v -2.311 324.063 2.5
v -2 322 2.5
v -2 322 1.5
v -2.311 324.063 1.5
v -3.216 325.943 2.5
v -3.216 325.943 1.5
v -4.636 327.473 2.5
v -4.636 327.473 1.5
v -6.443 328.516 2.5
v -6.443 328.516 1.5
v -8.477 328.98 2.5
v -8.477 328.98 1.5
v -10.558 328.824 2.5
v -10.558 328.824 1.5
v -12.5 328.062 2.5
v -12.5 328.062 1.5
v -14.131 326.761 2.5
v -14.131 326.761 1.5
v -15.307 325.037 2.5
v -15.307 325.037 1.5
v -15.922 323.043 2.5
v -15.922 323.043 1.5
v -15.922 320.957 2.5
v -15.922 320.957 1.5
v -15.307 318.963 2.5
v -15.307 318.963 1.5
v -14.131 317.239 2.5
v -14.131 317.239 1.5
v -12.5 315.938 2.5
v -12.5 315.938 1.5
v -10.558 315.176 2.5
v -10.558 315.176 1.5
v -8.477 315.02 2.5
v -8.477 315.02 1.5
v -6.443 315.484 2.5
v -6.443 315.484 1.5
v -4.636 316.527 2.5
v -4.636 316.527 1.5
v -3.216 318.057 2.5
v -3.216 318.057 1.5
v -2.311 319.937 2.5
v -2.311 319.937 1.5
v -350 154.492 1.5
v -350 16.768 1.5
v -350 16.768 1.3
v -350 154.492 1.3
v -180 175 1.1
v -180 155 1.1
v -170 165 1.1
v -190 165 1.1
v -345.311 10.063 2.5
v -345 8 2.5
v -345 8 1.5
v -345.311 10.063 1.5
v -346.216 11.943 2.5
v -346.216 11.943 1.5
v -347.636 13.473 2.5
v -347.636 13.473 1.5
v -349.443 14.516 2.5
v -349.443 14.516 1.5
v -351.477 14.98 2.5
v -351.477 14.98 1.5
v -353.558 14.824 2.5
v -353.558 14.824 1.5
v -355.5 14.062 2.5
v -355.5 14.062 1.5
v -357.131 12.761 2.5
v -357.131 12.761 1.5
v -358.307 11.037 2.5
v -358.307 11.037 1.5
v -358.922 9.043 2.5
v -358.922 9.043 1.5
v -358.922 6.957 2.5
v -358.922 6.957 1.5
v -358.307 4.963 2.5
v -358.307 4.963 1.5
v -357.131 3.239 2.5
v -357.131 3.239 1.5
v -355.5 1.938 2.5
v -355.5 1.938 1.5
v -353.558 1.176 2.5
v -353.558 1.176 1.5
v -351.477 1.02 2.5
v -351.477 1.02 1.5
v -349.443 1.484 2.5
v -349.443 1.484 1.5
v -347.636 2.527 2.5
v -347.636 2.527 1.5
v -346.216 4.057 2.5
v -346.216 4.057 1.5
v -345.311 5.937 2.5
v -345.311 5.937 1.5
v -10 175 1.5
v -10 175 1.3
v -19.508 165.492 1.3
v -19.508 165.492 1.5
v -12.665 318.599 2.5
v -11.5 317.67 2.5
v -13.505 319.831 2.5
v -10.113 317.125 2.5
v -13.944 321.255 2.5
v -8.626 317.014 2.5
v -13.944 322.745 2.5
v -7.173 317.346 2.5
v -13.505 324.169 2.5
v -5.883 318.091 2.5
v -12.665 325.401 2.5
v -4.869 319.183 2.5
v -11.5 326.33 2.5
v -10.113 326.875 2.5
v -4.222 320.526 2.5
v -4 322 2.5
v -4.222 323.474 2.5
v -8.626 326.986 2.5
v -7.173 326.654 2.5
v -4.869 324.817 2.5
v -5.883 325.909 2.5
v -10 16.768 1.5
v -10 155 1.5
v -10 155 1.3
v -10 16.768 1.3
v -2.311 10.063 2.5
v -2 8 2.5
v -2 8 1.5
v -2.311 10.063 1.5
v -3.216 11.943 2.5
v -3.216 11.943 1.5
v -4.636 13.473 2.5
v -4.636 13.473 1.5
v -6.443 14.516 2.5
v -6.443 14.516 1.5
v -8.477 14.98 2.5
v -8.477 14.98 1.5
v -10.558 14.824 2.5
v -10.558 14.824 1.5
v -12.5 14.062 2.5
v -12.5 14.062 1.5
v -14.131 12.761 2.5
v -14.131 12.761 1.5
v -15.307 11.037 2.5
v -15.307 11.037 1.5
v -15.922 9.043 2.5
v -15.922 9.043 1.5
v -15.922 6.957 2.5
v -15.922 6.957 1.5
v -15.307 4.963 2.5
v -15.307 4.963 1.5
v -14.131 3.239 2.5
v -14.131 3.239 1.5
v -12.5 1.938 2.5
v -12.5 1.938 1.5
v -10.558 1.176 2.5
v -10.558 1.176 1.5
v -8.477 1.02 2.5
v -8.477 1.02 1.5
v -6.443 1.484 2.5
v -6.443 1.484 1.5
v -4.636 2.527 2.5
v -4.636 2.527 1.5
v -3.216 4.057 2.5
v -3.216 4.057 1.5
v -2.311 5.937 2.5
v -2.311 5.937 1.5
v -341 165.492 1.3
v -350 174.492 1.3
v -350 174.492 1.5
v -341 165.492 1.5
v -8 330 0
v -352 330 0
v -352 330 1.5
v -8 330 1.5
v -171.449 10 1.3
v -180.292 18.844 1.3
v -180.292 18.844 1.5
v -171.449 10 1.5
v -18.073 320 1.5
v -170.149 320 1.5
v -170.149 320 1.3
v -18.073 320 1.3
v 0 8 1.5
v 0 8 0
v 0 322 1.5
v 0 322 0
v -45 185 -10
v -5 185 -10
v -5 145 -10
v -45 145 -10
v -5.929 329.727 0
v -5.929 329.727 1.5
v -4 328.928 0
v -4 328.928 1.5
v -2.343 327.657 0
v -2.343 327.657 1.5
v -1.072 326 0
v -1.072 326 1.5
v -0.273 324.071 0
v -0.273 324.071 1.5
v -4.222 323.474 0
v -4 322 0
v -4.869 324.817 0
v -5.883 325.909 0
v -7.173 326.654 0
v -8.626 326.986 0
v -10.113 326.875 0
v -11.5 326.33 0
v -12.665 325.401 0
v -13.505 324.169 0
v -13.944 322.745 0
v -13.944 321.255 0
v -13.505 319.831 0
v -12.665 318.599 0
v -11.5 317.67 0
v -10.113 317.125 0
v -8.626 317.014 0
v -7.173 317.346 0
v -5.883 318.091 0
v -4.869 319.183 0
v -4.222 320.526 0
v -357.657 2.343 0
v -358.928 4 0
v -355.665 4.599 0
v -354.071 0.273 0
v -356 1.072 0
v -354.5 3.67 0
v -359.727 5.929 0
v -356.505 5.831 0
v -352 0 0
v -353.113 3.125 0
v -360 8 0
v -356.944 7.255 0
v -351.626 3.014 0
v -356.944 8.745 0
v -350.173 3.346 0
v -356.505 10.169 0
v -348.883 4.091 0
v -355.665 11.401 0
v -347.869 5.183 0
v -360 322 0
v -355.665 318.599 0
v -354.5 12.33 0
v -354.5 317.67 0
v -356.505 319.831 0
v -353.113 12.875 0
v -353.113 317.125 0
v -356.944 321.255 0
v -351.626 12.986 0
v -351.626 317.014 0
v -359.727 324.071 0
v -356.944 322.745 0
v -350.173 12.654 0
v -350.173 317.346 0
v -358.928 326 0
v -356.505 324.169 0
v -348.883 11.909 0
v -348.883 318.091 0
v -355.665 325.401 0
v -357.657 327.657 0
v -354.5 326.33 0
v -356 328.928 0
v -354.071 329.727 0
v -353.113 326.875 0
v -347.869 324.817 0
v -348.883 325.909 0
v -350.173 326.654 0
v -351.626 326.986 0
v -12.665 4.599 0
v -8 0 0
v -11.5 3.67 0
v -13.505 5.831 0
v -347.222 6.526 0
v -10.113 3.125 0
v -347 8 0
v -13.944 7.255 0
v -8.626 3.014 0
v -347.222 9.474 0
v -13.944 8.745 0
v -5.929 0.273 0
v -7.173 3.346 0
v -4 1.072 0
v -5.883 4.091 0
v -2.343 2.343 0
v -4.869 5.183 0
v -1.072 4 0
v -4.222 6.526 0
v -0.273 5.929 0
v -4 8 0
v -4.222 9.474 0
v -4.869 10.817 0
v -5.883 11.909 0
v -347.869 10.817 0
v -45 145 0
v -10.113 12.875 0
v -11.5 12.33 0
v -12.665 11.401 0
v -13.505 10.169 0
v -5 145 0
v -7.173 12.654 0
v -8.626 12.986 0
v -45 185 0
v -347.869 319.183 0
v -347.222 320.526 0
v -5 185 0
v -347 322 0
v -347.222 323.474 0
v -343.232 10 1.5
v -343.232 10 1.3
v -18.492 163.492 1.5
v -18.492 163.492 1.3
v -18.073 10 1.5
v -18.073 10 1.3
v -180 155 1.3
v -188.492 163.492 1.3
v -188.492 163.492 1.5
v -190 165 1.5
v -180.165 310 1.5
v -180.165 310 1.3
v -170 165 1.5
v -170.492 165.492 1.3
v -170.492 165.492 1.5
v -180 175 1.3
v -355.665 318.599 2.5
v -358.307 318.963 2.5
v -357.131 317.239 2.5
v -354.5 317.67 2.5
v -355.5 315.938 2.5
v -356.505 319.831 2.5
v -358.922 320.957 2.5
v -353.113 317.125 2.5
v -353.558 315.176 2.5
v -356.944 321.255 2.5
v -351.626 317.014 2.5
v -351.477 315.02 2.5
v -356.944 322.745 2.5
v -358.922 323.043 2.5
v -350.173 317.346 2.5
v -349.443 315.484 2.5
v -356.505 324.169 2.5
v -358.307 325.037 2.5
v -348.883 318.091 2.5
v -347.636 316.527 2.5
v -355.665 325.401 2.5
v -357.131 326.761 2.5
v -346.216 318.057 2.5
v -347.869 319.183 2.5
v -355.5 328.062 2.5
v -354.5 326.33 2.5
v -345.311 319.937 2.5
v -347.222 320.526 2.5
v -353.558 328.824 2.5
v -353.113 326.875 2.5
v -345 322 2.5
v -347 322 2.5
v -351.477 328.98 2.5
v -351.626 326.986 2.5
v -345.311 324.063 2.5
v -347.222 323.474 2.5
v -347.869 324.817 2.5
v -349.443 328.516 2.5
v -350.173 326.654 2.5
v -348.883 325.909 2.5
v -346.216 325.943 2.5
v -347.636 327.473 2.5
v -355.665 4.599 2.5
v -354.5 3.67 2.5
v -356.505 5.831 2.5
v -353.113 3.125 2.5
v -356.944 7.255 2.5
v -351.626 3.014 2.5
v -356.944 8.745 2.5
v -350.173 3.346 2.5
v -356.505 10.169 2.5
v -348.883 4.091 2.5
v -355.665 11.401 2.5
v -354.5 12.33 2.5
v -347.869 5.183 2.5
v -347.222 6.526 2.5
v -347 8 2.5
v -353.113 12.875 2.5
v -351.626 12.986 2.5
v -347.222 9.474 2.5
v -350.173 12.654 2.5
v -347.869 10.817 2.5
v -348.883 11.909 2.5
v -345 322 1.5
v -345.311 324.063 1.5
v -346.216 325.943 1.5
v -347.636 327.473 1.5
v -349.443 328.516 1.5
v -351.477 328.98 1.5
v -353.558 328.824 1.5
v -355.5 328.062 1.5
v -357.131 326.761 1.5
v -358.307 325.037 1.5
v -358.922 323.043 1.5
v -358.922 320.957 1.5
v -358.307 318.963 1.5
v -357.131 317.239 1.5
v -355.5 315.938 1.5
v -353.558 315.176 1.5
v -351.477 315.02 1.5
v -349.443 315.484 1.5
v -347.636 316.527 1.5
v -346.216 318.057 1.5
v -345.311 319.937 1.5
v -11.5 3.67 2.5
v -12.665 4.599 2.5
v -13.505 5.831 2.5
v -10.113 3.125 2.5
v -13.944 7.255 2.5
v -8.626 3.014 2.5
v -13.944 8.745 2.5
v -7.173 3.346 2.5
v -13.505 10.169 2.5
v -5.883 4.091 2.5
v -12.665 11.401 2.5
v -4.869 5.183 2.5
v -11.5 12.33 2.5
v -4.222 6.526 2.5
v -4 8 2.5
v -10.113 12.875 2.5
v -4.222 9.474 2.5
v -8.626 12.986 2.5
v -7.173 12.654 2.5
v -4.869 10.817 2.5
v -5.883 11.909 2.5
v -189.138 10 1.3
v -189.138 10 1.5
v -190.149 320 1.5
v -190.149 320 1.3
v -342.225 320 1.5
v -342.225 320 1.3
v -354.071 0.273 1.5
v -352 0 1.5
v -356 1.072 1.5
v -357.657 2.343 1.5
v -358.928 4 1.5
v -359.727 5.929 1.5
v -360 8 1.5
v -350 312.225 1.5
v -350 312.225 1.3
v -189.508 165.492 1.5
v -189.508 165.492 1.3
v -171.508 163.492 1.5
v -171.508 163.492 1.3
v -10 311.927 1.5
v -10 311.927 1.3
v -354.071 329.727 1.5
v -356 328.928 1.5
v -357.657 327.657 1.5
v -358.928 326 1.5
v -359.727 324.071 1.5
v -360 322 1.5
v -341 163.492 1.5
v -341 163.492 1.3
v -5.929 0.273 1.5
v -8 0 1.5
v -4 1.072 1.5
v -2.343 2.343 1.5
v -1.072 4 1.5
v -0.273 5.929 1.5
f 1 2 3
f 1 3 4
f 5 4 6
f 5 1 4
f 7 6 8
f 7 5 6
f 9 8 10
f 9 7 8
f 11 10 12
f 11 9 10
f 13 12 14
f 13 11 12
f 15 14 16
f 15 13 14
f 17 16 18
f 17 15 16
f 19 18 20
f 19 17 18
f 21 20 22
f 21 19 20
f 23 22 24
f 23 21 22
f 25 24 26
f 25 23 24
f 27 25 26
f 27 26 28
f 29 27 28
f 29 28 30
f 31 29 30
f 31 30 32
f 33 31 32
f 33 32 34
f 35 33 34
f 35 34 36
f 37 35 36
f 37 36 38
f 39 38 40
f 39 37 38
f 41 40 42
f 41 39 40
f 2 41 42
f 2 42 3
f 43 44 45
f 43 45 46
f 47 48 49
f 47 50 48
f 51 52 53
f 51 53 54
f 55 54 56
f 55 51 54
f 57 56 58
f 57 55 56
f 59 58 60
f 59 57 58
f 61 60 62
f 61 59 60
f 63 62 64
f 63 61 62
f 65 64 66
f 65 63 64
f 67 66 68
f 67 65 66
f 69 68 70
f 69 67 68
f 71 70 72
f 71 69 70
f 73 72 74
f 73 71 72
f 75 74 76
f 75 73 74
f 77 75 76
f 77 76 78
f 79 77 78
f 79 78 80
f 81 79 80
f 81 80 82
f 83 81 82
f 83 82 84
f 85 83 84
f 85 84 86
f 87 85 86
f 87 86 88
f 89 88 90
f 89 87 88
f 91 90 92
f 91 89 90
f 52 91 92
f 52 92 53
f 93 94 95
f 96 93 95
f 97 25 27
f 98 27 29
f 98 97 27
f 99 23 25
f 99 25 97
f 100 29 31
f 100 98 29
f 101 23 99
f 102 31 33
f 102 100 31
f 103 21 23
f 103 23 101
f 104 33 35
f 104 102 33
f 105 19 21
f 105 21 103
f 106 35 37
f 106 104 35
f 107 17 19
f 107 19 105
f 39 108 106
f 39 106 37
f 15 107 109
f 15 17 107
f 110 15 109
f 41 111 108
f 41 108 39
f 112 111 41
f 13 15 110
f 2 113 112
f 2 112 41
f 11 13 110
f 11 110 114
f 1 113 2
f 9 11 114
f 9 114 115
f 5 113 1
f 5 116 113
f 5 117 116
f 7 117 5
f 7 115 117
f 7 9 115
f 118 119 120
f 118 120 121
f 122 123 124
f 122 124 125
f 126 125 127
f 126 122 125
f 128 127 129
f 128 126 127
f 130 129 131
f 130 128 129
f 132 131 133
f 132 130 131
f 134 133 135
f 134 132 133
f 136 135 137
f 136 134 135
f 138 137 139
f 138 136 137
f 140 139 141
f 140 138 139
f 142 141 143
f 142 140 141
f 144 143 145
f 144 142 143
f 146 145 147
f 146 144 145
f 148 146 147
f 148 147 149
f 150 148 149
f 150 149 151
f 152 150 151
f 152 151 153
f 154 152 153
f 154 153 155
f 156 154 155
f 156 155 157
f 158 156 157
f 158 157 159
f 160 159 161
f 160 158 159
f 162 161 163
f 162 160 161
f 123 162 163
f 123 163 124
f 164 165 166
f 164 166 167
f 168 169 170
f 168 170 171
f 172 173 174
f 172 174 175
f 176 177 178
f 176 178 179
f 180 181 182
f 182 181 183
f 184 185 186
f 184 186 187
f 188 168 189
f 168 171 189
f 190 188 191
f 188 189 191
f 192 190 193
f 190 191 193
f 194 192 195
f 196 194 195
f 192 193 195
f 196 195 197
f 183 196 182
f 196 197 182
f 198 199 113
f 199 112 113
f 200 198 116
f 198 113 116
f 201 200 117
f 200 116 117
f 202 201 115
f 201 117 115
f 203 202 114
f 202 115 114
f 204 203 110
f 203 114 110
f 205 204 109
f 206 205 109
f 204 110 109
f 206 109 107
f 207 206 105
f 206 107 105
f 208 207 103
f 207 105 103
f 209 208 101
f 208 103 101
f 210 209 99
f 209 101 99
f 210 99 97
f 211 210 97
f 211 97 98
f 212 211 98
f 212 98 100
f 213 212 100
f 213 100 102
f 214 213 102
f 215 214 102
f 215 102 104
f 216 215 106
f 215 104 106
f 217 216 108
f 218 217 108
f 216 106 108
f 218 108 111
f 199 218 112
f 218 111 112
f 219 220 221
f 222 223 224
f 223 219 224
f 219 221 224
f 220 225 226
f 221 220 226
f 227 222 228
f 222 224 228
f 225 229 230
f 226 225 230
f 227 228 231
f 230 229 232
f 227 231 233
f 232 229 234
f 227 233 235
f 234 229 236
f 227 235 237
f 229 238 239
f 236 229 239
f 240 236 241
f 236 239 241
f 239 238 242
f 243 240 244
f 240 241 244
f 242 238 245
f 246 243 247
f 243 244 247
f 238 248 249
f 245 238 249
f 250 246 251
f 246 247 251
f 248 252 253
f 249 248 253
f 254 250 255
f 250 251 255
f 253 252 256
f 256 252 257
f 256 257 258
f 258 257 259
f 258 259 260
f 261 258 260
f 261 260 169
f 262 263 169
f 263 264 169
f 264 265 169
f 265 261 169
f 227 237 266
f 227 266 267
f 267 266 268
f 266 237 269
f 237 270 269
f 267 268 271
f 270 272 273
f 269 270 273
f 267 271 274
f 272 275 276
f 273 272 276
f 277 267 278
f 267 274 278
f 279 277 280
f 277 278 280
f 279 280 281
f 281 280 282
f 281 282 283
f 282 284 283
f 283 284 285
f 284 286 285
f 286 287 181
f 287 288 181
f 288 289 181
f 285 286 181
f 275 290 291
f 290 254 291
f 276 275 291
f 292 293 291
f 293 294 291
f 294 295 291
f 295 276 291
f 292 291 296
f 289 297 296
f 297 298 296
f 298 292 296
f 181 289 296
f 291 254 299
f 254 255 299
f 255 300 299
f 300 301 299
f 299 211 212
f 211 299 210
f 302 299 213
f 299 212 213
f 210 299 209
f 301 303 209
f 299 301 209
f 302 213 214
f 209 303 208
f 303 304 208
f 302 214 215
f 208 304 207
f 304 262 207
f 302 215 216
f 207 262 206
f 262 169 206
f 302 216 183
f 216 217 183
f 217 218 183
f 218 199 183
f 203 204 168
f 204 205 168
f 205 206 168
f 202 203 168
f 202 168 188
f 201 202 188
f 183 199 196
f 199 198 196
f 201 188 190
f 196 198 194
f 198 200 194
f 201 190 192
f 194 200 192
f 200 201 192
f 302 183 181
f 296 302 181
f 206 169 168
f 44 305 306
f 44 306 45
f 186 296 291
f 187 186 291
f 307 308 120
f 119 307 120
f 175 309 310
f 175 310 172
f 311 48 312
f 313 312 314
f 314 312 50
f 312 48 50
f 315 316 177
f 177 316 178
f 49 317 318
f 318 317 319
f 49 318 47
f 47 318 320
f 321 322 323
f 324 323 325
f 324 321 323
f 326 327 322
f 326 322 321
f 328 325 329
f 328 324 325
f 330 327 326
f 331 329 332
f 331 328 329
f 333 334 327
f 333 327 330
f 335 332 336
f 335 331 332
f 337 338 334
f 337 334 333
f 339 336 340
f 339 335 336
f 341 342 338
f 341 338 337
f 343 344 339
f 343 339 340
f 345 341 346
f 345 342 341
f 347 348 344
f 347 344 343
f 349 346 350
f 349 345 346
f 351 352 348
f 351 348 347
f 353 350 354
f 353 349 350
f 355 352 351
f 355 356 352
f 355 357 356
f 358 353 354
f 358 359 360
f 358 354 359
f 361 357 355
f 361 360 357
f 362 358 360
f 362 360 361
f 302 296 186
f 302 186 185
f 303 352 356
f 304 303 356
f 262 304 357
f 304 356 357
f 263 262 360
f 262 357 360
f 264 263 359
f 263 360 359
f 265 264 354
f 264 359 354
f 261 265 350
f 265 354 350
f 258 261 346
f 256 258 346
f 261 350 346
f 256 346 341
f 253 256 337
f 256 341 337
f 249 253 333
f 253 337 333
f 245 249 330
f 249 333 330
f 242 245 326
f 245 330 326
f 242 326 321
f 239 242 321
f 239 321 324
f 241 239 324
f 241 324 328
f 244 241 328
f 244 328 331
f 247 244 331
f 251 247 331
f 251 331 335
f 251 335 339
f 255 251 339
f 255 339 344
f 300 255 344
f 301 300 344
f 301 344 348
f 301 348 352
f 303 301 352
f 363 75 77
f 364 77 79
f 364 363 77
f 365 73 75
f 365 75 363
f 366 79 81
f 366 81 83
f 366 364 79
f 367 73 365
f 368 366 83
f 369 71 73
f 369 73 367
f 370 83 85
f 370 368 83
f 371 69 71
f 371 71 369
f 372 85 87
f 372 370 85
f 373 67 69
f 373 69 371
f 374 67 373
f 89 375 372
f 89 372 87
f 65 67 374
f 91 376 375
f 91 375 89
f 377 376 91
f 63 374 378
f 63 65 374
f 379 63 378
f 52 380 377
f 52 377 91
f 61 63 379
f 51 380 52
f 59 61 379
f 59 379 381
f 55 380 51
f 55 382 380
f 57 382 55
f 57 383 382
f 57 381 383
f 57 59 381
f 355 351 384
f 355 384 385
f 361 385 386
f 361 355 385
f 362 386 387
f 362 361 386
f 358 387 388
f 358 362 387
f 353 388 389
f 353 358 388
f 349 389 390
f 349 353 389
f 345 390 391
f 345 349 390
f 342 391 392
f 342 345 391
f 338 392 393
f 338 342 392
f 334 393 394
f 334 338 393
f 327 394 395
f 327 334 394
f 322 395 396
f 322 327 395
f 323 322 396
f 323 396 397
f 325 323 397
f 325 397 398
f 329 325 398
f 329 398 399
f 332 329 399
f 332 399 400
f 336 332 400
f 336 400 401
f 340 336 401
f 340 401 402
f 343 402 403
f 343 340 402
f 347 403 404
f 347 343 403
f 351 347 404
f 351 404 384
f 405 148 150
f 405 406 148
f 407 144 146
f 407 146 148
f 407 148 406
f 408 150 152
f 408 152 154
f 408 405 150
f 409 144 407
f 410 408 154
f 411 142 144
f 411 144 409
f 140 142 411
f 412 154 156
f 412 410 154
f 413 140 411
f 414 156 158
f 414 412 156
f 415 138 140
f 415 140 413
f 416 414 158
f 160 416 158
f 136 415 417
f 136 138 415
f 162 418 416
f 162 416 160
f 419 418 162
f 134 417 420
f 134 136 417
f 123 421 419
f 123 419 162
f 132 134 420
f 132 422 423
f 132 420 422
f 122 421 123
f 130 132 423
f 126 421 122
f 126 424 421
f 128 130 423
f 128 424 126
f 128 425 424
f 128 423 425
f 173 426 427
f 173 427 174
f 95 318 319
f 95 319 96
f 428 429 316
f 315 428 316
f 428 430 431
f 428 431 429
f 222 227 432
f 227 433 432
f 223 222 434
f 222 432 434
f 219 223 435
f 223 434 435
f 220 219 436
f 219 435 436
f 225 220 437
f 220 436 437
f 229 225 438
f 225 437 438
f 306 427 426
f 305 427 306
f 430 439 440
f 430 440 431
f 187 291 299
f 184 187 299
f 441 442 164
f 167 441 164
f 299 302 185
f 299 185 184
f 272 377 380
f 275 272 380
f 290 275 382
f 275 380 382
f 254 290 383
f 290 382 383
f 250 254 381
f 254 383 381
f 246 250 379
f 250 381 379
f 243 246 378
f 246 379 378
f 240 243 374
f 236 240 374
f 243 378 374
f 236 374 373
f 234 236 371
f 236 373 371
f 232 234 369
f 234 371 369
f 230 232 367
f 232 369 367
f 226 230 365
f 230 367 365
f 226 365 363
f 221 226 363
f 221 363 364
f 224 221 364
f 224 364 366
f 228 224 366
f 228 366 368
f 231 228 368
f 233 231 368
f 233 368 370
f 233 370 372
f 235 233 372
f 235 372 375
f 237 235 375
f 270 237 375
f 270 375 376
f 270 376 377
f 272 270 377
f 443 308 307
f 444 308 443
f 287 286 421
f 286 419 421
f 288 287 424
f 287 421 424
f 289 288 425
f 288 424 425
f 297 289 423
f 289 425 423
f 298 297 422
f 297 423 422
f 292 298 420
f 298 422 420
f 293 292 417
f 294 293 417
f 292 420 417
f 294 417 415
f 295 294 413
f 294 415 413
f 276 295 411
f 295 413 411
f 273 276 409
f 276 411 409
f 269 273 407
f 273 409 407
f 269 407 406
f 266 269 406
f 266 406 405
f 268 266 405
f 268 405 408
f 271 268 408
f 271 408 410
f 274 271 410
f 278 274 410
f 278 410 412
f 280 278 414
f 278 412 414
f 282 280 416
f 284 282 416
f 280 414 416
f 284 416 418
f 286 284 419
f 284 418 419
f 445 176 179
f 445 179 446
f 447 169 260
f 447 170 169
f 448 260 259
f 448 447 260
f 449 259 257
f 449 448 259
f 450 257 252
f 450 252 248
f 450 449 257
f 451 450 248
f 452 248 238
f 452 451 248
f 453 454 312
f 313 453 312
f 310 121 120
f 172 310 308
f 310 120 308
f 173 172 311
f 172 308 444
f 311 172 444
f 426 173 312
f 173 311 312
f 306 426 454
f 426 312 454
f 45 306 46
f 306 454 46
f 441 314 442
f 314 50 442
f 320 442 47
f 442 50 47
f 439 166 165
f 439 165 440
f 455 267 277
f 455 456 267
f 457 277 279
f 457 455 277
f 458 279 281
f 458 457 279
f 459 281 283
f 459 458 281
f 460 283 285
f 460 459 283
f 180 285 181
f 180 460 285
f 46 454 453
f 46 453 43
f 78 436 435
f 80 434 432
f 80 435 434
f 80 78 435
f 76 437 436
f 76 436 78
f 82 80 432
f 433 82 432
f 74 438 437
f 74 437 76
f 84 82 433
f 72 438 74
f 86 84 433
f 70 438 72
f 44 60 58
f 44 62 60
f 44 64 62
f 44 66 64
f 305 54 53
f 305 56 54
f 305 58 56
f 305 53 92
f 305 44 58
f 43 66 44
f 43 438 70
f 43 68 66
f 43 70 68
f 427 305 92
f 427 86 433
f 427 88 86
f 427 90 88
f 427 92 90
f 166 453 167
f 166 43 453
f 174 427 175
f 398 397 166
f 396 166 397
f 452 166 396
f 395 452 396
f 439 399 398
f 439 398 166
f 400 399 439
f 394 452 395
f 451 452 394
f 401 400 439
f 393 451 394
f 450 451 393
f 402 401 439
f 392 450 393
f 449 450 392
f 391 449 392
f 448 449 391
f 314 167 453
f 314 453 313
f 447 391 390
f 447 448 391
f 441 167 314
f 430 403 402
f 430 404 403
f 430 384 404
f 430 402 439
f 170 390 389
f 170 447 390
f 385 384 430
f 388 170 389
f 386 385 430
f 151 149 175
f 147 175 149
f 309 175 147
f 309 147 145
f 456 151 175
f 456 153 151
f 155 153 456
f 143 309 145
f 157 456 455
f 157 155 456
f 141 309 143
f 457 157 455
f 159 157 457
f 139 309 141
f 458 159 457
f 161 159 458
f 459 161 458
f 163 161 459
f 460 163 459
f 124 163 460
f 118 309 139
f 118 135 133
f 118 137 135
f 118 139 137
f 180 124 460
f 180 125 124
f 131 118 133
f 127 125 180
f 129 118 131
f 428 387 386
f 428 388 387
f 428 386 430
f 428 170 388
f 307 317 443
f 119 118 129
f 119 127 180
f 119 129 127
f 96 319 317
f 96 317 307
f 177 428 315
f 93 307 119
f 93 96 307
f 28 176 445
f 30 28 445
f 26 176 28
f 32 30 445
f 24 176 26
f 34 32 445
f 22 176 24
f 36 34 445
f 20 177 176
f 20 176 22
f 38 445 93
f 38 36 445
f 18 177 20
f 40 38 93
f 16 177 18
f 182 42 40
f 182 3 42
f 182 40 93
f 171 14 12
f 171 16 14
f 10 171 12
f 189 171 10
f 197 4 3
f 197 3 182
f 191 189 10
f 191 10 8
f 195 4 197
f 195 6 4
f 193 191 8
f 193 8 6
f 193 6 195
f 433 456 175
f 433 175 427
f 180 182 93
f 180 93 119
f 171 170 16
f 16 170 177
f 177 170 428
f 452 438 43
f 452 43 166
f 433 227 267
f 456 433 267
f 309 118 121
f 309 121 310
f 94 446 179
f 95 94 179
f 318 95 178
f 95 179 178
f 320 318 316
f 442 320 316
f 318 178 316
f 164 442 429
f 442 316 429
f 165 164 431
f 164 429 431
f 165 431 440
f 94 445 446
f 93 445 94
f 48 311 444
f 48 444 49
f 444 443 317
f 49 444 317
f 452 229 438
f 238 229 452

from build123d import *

# Parameters (mm, degrees)
ESQUISSE1_W                     = 360
ESQUISSE1_H                     = 330
BOSS_EXTRU_1_DEPTH              = 1.5
ESQUISSE2_R                     = 5
ENL_V_MAT_EXTRU_1_DEPTH         = 1.5
BOSS_EXTRU_2_START              = 1
ESQUISSE3_R                     = 7
ESQUISSE3_R_2                   = 5
BOSS_EXTRU_2_DEPTH              = 1
CONG_2_R                        = 8
CONG_4_R                        = 8
R_P_TITION_LIN_AIRE2_COUNT      = 2
R_P_TITION_LIN_AIRE2_PITCH      = 343
R_P_TITION_LIN_AIRE2_COUNT_DIR2 = 2
R_P_TITION_LIN_AIRE2_PITCH_DIR2 = 314
ENL_V_MAT_EXTRU_2_DEPTH         = 0.2
ENL_V_MAT_EXTRU_3_DEPTH         = 0.2
BOSS_EXTRU_3_DEPTH              = 0.2
BOSS_EXTRU_4_DEPTH              = 0.2
BOSS_EXTRU_5_DEPTH              = 0.2
ESQUISSE9_W                     = 40
ESQUISSE9_H                     = 40
BOSS_EXTRU_6_DEPTH              = 10


with BuildPart() as part:
    # Esquisse1 → Boss.-Extru.1 (new body)
    with BuildSketch(Plane.XY):
        with Locations((-180, 165)):
            Rectangle(ESQUISSE1_W, ESQUISSE1_H)
    extrude(amount=BOSS_EXTRU_1_DEPTH)

    # Esquisse2 → Enlèv. mat.-Extru.1 (cut)
    with BuildSketch(Plane.XY.offset(1.5)):
        with Locations((-352, 322)):
            Circle(ESQUISSE2_R)
    enl_v_mat_extru_1 = extrude(amount=-ENL_V_MAT_EXTRU_1_DEPTH, mode=Mode.SUBTRACT)

    # Esquisse3 → Boss.-Extru.2 (add)
    with BuildSketch(Plane.XY.offset(1.5).offset(BOSS_EXTRU_2_START)):
        with Locations((-352, 322)):
            Circle(ESQUISSE3_R)
        with Locations((-352, 322)):
            Circle(ESQUISSE3_R_2, mode=Mode.SUBTRACT)
    boss_extru_2 = extrude(amount=-BOSS_EXTRU_2_DEPTH)

    # Congé2
    cong_2_edges = [part.edges().sort_by_distance(p)[0] for p in [
        (-360, 0, 0.75),
        (-360, 330, 0.75),
    ]]
    fillet(cong_2_edges, radius=CONG_2_R)

    # Congé4
    cong_4_edges = [part.edges().sort_by_distance(p)[0] for p in [
        (0, 0, 0.75),
        (0, 330, 0.75),
    ]]
    fillet(cong_4_edges, radius=CONG_4_R)

    # Répétition linéaire2: Enlèv. mat.-Extru.1, Boss.-Extru.2 2 × 2
    with Locations(*[(i * R_P_TITION_LIN_AIRE2_PITCH, -j * R_P_TITION_LIN_AIRE2_PITCH_DIR2, 0) for i in range(R_P_TITION_LIN_AIRE2_COUNT) for j in range(R_P_TITION_LIN_AIRE2_COUNT_DIR2) if (i, j) != (0, 0)]):
        add(enl_v_mat_extru_1, mode=Mode.SUBTRACT)
        add(boss_extru_2)

    # Esquisse4 → Enlèv. mat.-Extru.2 (cut)
    with BuildSketch(Plane.XY.offset(1.5)):
        Polygon((-342.224801163, 320), (-18.072831487, 320), (-10, 311.927168513), (-10, 16.768229134), (-18.072831487, 10), (-343.231770866, 10), (-350, 16.768229134), (-350, 312.224801163), align=None)
    extrude(amount=-ENL_V_MAT_EXTRU_2_DEPTH, mode=Mode.SUBTRACT)

    # Esquisse5 → Enlèv. mat.-Extru.3 (cut)
    with BuildSketch(Plane.XY.offset(1.3)):
        Polygon((-180, 155), (-170, 165), (-180, 175), (-190, 165), align=None)
    extrude(amount=-ENL_V_MAT_EXTRU_3_DEPTH, mode=Mode.SUBTRACT)

    # Esquisse6 → Boss.-Extru.3 (add)
    with BuildSketch(Plane.XY.offset(1.3)):
        Polygon((-190.148829514, 320), (-180.16505775, 310.000013168), (-170.148829514, 320), align=None)
        Polygon((-350, 174.492138197), (-340, 164.492138197), (-350, 154.492138197), align=None)
        Polygon((-190.285016954, 8.853157765), (-180.292495127, 18.844401072), (-170.285024617, 8.835649966), align=None)
    extrude(amount=BOSS_EXTRU_3_DEPTH)

    # Esquisse7 → Boss.-Extru.4 (add)
    with BuildSketch(Plane.XY.offset(1.3)):
        Polygon((-10, 175), (-20, 165), (-10, 155), align=None)
    extrude(amount=BOSS_EXTRU_4_DEPTH)

    # Esquisse8 → Boss.-Extru.5 (add)
    with BuildSketch(Plane.XY.offset(1.3)):
        Polygon((-341, 163.492138197), (-188.492138197, 163.492138197), (-190, 165), (-189.507861803, 165.492138197), (-341, 165.492138197), align=None)
        Polygon((-6.914170883, 165.492138197), (-6.914170883, 163.492138197), (-171.507861803, 163.492138197), (-170, 165), (-170.492138197, 165.492138197), align=None)
    extrude(amount=BOSS_EXTRU_5_DEPTH)

    # Esquisse9 → Boss.-Extru.6 (add)
    with BuildSketch(Plane(origin=(0, 0, 0), x_dir=(-1, 0, 0), z_dir=(0, 0, -1))):
        with Locations((25, 165)):
            Rectangle(ESQUISSE9_W, ESQUISSE9_H)
    extrude(amount=BOSS_EXTRU_6_DEPTH)


solid = part.part
